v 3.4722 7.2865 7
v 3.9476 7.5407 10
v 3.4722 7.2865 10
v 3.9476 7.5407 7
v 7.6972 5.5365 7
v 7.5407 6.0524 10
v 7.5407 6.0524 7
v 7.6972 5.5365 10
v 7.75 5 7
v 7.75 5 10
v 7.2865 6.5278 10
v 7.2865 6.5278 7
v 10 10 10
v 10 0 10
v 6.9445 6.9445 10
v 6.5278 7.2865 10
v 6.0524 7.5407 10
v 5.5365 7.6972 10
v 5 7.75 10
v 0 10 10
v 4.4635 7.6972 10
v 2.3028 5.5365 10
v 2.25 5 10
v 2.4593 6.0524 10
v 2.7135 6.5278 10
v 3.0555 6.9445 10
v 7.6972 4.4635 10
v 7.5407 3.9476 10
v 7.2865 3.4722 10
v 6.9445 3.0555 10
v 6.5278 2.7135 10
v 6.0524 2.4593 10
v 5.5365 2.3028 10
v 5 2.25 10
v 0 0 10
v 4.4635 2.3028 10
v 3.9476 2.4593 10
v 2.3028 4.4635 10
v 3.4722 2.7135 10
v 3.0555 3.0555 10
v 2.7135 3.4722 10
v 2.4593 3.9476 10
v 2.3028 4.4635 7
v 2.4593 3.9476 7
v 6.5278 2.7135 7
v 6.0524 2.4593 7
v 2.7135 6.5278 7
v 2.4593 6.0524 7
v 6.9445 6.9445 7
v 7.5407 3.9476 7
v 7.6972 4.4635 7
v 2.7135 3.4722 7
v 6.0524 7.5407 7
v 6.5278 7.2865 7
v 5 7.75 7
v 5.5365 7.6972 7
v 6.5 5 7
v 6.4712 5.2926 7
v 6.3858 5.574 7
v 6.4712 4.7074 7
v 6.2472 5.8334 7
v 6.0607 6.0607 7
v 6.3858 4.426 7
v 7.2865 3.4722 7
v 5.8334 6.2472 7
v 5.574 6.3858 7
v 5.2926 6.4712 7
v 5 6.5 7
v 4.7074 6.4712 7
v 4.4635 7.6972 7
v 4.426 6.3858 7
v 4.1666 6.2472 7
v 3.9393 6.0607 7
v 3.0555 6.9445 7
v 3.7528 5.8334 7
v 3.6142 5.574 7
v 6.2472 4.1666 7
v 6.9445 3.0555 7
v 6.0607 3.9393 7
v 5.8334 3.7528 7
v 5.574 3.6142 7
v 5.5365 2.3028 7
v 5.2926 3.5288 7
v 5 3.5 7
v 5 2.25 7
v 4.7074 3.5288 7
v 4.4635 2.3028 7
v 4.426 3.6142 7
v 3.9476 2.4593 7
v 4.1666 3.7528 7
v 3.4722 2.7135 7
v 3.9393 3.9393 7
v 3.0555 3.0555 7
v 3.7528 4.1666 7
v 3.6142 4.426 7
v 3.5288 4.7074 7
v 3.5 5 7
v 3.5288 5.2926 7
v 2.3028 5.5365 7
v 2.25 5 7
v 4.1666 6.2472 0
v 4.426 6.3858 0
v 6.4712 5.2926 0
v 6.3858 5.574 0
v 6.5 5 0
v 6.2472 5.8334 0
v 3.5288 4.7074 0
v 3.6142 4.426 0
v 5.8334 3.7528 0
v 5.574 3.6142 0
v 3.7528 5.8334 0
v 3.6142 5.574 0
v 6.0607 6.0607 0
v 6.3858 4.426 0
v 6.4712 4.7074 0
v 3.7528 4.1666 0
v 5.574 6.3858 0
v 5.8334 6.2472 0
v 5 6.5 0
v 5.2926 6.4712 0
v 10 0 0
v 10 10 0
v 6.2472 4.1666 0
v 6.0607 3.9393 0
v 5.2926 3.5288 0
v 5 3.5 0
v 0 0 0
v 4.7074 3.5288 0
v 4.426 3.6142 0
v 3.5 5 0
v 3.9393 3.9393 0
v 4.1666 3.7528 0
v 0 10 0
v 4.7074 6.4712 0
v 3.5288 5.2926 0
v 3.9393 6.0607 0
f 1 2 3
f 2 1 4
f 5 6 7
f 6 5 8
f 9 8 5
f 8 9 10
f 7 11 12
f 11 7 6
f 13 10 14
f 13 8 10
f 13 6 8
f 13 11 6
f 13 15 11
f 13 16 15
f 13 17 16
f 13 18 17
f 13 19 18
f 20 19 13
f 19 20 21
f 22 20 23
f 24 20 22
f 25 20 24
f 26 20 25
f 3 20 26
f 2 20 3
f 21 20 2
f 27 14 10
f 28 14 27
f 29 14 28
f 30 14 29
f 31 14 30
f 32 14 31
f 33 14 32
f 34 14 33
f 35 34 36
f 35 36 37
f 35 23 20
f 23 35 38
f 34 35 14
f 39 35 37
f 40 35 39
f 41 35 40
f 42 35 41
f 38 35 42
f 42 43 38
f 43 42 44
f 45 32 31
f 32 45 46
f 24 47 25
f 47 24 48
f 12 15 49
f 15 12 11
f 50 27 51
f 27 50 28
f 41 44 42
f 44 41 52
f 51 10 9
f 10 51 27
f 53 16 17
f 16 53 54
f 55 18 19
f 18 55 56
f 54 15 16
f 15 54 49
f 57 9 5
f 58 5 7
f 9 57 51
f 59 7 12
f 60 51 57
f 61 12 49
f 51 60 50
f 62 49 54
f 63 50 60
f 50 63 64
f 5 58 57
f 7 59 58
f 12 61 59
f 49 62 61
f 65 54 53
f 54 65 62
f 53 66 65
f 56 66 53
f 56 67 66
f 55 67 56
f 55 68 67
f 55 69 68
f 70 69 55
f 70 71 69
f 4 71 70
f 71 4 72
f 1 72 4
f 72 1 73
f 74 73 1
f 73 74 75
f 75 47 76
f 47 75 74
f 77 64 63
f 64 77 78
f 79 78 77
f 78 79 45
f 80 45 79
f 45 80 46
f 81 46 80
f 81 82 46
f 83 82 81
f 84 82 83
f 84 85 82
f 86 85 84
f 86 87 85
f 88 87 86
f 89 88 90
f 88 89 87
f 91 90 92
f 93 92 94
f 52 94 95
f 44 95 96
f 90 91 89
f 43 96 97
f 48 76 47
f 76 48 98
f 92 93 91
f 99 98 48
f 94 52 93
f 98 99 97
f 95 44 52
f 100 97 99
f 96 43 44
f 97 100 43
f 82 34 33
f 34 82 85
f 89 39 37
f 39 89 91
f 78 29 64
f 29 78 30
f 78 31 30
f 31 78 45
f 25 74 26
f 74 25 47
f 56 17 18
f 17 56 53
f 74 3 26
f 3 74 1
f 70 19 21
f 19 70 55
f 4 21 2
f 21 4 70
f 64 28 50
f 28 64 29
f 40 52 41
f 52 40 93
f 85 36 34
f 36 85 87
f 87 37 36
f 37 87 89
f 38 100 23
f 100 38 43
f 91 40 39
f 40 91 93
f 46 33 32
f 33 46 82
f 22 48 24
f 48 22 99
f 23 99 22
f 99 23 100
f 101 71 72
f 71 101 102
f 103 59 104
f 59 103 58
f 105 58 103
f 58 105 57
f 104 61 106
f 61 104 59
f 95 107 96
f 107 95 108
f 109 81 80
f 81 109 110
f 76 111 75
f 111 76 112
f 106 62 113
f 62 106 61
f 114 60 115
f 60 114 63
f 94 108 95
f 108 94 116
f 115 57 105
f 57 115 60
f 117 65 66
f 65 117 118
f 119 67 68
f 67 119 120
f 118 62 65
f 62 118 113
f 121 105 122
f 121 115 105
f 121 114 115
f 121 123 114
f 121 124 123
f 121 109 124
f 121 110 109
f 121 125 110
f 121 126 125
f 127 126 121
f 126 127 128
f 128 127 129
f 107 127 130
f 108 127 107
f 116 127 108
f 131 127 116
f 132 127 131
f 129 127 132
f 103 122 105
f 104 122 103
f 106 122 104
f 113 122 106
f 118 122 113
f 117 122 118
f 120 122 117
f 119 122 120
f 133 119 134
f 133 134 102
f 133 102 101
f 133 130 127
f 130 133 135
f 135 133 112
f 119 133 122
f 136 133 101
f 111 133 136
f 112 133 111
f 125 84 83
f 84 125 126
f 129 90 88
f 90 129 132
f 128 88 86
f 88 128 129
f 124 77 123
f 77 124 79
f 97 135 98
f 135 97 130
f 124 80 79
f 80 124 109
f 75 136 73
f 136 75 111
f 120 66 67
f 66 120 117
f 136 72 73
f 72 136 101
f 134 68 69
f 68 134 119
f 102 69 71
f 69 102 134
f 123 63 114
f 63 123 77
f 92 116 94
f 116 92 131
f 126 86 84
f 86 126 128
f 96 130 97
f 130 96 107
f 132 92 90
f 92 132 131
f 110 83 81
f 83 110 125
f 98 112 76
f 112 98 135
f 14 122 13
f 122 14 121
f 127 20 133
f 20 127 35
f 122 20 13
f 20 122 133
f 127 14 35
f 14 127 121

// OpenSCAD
// file: base.scad
module din_help(name, _STD_TABLE) {
    echo("-----------------------------");
    echo(str("Size indexes for ", name));
    for(idx=[0:len(_STD_TABLE)-1]) {
        echo(str(idx, " = M", _STD_TABLE[idx][0]));
    }
    echo("-----------------------------");
}

module din_cutout_base(inner, outer, cap_height, height, fn) {
    translate([0, 0, height]) {
        mirror([0, 0, 1]) {
            cylinder(r=outer/2, h=cap_height, center=false, $fn = fn);
            cylinder(r=inner/2, h=height, center=false, $fn = 32);
        }
    }
}

module hex_nut(inner, outer, cap_height, height = 0) {
    din_cutout_base(inner, outer, cap_height, height, 6);
}

module round_bolt(inner, outer, cap_height, height = 0) {
    din_cutout_base(inner, outer, cap_height, height, 32);
}

translate([-10, 0, 0]) round_bolt(inner = 3, outer = 6.01, cap_height = 2.4, height = 10);
translate([10, 0, 0]) hex_nut(inner = 3, outer = 6.01, cap_height = 2.4, height = 10);
// main file
use <./base.scad>
/*
    format: [size, diameter, cap_height]
            [d1, d2, k]
*/
_DIN_912_STD = [[2,3.8,2],[3,5.5,3],[4,7,4],[5,8.5,5],[6,10,6],[8,13,8],[10,16,10],[12,18,12],[14,21,14],[16,24,16],[18,27,18],[20,30,20],[24,36,24],[27,40,27],[30,45,30],[36,54,36]];

module din912_help() {
    din_help("DIN 912", _DIN_912_STD);
}

module din912_base(m_idx, height) {
    row = _DIN_912_STD[m_idx];
    inner = row[0];
    outer = row[1];
    cap_height = row[2];
    round_bolt(inner, outer, cap_height, height);
}

module din912(m_idx, height, coords) {
    difference() {
        children();
        for(i=[0:len(coords) - 1]) {
            translate([coords[i][0], coords[i][1], 0])
                din912_base(m_idx, height);
        }
    }
}

din912_help();

din912(1, 10, [[5, 5]]) {
    cube([10, 10, 10]);
}
